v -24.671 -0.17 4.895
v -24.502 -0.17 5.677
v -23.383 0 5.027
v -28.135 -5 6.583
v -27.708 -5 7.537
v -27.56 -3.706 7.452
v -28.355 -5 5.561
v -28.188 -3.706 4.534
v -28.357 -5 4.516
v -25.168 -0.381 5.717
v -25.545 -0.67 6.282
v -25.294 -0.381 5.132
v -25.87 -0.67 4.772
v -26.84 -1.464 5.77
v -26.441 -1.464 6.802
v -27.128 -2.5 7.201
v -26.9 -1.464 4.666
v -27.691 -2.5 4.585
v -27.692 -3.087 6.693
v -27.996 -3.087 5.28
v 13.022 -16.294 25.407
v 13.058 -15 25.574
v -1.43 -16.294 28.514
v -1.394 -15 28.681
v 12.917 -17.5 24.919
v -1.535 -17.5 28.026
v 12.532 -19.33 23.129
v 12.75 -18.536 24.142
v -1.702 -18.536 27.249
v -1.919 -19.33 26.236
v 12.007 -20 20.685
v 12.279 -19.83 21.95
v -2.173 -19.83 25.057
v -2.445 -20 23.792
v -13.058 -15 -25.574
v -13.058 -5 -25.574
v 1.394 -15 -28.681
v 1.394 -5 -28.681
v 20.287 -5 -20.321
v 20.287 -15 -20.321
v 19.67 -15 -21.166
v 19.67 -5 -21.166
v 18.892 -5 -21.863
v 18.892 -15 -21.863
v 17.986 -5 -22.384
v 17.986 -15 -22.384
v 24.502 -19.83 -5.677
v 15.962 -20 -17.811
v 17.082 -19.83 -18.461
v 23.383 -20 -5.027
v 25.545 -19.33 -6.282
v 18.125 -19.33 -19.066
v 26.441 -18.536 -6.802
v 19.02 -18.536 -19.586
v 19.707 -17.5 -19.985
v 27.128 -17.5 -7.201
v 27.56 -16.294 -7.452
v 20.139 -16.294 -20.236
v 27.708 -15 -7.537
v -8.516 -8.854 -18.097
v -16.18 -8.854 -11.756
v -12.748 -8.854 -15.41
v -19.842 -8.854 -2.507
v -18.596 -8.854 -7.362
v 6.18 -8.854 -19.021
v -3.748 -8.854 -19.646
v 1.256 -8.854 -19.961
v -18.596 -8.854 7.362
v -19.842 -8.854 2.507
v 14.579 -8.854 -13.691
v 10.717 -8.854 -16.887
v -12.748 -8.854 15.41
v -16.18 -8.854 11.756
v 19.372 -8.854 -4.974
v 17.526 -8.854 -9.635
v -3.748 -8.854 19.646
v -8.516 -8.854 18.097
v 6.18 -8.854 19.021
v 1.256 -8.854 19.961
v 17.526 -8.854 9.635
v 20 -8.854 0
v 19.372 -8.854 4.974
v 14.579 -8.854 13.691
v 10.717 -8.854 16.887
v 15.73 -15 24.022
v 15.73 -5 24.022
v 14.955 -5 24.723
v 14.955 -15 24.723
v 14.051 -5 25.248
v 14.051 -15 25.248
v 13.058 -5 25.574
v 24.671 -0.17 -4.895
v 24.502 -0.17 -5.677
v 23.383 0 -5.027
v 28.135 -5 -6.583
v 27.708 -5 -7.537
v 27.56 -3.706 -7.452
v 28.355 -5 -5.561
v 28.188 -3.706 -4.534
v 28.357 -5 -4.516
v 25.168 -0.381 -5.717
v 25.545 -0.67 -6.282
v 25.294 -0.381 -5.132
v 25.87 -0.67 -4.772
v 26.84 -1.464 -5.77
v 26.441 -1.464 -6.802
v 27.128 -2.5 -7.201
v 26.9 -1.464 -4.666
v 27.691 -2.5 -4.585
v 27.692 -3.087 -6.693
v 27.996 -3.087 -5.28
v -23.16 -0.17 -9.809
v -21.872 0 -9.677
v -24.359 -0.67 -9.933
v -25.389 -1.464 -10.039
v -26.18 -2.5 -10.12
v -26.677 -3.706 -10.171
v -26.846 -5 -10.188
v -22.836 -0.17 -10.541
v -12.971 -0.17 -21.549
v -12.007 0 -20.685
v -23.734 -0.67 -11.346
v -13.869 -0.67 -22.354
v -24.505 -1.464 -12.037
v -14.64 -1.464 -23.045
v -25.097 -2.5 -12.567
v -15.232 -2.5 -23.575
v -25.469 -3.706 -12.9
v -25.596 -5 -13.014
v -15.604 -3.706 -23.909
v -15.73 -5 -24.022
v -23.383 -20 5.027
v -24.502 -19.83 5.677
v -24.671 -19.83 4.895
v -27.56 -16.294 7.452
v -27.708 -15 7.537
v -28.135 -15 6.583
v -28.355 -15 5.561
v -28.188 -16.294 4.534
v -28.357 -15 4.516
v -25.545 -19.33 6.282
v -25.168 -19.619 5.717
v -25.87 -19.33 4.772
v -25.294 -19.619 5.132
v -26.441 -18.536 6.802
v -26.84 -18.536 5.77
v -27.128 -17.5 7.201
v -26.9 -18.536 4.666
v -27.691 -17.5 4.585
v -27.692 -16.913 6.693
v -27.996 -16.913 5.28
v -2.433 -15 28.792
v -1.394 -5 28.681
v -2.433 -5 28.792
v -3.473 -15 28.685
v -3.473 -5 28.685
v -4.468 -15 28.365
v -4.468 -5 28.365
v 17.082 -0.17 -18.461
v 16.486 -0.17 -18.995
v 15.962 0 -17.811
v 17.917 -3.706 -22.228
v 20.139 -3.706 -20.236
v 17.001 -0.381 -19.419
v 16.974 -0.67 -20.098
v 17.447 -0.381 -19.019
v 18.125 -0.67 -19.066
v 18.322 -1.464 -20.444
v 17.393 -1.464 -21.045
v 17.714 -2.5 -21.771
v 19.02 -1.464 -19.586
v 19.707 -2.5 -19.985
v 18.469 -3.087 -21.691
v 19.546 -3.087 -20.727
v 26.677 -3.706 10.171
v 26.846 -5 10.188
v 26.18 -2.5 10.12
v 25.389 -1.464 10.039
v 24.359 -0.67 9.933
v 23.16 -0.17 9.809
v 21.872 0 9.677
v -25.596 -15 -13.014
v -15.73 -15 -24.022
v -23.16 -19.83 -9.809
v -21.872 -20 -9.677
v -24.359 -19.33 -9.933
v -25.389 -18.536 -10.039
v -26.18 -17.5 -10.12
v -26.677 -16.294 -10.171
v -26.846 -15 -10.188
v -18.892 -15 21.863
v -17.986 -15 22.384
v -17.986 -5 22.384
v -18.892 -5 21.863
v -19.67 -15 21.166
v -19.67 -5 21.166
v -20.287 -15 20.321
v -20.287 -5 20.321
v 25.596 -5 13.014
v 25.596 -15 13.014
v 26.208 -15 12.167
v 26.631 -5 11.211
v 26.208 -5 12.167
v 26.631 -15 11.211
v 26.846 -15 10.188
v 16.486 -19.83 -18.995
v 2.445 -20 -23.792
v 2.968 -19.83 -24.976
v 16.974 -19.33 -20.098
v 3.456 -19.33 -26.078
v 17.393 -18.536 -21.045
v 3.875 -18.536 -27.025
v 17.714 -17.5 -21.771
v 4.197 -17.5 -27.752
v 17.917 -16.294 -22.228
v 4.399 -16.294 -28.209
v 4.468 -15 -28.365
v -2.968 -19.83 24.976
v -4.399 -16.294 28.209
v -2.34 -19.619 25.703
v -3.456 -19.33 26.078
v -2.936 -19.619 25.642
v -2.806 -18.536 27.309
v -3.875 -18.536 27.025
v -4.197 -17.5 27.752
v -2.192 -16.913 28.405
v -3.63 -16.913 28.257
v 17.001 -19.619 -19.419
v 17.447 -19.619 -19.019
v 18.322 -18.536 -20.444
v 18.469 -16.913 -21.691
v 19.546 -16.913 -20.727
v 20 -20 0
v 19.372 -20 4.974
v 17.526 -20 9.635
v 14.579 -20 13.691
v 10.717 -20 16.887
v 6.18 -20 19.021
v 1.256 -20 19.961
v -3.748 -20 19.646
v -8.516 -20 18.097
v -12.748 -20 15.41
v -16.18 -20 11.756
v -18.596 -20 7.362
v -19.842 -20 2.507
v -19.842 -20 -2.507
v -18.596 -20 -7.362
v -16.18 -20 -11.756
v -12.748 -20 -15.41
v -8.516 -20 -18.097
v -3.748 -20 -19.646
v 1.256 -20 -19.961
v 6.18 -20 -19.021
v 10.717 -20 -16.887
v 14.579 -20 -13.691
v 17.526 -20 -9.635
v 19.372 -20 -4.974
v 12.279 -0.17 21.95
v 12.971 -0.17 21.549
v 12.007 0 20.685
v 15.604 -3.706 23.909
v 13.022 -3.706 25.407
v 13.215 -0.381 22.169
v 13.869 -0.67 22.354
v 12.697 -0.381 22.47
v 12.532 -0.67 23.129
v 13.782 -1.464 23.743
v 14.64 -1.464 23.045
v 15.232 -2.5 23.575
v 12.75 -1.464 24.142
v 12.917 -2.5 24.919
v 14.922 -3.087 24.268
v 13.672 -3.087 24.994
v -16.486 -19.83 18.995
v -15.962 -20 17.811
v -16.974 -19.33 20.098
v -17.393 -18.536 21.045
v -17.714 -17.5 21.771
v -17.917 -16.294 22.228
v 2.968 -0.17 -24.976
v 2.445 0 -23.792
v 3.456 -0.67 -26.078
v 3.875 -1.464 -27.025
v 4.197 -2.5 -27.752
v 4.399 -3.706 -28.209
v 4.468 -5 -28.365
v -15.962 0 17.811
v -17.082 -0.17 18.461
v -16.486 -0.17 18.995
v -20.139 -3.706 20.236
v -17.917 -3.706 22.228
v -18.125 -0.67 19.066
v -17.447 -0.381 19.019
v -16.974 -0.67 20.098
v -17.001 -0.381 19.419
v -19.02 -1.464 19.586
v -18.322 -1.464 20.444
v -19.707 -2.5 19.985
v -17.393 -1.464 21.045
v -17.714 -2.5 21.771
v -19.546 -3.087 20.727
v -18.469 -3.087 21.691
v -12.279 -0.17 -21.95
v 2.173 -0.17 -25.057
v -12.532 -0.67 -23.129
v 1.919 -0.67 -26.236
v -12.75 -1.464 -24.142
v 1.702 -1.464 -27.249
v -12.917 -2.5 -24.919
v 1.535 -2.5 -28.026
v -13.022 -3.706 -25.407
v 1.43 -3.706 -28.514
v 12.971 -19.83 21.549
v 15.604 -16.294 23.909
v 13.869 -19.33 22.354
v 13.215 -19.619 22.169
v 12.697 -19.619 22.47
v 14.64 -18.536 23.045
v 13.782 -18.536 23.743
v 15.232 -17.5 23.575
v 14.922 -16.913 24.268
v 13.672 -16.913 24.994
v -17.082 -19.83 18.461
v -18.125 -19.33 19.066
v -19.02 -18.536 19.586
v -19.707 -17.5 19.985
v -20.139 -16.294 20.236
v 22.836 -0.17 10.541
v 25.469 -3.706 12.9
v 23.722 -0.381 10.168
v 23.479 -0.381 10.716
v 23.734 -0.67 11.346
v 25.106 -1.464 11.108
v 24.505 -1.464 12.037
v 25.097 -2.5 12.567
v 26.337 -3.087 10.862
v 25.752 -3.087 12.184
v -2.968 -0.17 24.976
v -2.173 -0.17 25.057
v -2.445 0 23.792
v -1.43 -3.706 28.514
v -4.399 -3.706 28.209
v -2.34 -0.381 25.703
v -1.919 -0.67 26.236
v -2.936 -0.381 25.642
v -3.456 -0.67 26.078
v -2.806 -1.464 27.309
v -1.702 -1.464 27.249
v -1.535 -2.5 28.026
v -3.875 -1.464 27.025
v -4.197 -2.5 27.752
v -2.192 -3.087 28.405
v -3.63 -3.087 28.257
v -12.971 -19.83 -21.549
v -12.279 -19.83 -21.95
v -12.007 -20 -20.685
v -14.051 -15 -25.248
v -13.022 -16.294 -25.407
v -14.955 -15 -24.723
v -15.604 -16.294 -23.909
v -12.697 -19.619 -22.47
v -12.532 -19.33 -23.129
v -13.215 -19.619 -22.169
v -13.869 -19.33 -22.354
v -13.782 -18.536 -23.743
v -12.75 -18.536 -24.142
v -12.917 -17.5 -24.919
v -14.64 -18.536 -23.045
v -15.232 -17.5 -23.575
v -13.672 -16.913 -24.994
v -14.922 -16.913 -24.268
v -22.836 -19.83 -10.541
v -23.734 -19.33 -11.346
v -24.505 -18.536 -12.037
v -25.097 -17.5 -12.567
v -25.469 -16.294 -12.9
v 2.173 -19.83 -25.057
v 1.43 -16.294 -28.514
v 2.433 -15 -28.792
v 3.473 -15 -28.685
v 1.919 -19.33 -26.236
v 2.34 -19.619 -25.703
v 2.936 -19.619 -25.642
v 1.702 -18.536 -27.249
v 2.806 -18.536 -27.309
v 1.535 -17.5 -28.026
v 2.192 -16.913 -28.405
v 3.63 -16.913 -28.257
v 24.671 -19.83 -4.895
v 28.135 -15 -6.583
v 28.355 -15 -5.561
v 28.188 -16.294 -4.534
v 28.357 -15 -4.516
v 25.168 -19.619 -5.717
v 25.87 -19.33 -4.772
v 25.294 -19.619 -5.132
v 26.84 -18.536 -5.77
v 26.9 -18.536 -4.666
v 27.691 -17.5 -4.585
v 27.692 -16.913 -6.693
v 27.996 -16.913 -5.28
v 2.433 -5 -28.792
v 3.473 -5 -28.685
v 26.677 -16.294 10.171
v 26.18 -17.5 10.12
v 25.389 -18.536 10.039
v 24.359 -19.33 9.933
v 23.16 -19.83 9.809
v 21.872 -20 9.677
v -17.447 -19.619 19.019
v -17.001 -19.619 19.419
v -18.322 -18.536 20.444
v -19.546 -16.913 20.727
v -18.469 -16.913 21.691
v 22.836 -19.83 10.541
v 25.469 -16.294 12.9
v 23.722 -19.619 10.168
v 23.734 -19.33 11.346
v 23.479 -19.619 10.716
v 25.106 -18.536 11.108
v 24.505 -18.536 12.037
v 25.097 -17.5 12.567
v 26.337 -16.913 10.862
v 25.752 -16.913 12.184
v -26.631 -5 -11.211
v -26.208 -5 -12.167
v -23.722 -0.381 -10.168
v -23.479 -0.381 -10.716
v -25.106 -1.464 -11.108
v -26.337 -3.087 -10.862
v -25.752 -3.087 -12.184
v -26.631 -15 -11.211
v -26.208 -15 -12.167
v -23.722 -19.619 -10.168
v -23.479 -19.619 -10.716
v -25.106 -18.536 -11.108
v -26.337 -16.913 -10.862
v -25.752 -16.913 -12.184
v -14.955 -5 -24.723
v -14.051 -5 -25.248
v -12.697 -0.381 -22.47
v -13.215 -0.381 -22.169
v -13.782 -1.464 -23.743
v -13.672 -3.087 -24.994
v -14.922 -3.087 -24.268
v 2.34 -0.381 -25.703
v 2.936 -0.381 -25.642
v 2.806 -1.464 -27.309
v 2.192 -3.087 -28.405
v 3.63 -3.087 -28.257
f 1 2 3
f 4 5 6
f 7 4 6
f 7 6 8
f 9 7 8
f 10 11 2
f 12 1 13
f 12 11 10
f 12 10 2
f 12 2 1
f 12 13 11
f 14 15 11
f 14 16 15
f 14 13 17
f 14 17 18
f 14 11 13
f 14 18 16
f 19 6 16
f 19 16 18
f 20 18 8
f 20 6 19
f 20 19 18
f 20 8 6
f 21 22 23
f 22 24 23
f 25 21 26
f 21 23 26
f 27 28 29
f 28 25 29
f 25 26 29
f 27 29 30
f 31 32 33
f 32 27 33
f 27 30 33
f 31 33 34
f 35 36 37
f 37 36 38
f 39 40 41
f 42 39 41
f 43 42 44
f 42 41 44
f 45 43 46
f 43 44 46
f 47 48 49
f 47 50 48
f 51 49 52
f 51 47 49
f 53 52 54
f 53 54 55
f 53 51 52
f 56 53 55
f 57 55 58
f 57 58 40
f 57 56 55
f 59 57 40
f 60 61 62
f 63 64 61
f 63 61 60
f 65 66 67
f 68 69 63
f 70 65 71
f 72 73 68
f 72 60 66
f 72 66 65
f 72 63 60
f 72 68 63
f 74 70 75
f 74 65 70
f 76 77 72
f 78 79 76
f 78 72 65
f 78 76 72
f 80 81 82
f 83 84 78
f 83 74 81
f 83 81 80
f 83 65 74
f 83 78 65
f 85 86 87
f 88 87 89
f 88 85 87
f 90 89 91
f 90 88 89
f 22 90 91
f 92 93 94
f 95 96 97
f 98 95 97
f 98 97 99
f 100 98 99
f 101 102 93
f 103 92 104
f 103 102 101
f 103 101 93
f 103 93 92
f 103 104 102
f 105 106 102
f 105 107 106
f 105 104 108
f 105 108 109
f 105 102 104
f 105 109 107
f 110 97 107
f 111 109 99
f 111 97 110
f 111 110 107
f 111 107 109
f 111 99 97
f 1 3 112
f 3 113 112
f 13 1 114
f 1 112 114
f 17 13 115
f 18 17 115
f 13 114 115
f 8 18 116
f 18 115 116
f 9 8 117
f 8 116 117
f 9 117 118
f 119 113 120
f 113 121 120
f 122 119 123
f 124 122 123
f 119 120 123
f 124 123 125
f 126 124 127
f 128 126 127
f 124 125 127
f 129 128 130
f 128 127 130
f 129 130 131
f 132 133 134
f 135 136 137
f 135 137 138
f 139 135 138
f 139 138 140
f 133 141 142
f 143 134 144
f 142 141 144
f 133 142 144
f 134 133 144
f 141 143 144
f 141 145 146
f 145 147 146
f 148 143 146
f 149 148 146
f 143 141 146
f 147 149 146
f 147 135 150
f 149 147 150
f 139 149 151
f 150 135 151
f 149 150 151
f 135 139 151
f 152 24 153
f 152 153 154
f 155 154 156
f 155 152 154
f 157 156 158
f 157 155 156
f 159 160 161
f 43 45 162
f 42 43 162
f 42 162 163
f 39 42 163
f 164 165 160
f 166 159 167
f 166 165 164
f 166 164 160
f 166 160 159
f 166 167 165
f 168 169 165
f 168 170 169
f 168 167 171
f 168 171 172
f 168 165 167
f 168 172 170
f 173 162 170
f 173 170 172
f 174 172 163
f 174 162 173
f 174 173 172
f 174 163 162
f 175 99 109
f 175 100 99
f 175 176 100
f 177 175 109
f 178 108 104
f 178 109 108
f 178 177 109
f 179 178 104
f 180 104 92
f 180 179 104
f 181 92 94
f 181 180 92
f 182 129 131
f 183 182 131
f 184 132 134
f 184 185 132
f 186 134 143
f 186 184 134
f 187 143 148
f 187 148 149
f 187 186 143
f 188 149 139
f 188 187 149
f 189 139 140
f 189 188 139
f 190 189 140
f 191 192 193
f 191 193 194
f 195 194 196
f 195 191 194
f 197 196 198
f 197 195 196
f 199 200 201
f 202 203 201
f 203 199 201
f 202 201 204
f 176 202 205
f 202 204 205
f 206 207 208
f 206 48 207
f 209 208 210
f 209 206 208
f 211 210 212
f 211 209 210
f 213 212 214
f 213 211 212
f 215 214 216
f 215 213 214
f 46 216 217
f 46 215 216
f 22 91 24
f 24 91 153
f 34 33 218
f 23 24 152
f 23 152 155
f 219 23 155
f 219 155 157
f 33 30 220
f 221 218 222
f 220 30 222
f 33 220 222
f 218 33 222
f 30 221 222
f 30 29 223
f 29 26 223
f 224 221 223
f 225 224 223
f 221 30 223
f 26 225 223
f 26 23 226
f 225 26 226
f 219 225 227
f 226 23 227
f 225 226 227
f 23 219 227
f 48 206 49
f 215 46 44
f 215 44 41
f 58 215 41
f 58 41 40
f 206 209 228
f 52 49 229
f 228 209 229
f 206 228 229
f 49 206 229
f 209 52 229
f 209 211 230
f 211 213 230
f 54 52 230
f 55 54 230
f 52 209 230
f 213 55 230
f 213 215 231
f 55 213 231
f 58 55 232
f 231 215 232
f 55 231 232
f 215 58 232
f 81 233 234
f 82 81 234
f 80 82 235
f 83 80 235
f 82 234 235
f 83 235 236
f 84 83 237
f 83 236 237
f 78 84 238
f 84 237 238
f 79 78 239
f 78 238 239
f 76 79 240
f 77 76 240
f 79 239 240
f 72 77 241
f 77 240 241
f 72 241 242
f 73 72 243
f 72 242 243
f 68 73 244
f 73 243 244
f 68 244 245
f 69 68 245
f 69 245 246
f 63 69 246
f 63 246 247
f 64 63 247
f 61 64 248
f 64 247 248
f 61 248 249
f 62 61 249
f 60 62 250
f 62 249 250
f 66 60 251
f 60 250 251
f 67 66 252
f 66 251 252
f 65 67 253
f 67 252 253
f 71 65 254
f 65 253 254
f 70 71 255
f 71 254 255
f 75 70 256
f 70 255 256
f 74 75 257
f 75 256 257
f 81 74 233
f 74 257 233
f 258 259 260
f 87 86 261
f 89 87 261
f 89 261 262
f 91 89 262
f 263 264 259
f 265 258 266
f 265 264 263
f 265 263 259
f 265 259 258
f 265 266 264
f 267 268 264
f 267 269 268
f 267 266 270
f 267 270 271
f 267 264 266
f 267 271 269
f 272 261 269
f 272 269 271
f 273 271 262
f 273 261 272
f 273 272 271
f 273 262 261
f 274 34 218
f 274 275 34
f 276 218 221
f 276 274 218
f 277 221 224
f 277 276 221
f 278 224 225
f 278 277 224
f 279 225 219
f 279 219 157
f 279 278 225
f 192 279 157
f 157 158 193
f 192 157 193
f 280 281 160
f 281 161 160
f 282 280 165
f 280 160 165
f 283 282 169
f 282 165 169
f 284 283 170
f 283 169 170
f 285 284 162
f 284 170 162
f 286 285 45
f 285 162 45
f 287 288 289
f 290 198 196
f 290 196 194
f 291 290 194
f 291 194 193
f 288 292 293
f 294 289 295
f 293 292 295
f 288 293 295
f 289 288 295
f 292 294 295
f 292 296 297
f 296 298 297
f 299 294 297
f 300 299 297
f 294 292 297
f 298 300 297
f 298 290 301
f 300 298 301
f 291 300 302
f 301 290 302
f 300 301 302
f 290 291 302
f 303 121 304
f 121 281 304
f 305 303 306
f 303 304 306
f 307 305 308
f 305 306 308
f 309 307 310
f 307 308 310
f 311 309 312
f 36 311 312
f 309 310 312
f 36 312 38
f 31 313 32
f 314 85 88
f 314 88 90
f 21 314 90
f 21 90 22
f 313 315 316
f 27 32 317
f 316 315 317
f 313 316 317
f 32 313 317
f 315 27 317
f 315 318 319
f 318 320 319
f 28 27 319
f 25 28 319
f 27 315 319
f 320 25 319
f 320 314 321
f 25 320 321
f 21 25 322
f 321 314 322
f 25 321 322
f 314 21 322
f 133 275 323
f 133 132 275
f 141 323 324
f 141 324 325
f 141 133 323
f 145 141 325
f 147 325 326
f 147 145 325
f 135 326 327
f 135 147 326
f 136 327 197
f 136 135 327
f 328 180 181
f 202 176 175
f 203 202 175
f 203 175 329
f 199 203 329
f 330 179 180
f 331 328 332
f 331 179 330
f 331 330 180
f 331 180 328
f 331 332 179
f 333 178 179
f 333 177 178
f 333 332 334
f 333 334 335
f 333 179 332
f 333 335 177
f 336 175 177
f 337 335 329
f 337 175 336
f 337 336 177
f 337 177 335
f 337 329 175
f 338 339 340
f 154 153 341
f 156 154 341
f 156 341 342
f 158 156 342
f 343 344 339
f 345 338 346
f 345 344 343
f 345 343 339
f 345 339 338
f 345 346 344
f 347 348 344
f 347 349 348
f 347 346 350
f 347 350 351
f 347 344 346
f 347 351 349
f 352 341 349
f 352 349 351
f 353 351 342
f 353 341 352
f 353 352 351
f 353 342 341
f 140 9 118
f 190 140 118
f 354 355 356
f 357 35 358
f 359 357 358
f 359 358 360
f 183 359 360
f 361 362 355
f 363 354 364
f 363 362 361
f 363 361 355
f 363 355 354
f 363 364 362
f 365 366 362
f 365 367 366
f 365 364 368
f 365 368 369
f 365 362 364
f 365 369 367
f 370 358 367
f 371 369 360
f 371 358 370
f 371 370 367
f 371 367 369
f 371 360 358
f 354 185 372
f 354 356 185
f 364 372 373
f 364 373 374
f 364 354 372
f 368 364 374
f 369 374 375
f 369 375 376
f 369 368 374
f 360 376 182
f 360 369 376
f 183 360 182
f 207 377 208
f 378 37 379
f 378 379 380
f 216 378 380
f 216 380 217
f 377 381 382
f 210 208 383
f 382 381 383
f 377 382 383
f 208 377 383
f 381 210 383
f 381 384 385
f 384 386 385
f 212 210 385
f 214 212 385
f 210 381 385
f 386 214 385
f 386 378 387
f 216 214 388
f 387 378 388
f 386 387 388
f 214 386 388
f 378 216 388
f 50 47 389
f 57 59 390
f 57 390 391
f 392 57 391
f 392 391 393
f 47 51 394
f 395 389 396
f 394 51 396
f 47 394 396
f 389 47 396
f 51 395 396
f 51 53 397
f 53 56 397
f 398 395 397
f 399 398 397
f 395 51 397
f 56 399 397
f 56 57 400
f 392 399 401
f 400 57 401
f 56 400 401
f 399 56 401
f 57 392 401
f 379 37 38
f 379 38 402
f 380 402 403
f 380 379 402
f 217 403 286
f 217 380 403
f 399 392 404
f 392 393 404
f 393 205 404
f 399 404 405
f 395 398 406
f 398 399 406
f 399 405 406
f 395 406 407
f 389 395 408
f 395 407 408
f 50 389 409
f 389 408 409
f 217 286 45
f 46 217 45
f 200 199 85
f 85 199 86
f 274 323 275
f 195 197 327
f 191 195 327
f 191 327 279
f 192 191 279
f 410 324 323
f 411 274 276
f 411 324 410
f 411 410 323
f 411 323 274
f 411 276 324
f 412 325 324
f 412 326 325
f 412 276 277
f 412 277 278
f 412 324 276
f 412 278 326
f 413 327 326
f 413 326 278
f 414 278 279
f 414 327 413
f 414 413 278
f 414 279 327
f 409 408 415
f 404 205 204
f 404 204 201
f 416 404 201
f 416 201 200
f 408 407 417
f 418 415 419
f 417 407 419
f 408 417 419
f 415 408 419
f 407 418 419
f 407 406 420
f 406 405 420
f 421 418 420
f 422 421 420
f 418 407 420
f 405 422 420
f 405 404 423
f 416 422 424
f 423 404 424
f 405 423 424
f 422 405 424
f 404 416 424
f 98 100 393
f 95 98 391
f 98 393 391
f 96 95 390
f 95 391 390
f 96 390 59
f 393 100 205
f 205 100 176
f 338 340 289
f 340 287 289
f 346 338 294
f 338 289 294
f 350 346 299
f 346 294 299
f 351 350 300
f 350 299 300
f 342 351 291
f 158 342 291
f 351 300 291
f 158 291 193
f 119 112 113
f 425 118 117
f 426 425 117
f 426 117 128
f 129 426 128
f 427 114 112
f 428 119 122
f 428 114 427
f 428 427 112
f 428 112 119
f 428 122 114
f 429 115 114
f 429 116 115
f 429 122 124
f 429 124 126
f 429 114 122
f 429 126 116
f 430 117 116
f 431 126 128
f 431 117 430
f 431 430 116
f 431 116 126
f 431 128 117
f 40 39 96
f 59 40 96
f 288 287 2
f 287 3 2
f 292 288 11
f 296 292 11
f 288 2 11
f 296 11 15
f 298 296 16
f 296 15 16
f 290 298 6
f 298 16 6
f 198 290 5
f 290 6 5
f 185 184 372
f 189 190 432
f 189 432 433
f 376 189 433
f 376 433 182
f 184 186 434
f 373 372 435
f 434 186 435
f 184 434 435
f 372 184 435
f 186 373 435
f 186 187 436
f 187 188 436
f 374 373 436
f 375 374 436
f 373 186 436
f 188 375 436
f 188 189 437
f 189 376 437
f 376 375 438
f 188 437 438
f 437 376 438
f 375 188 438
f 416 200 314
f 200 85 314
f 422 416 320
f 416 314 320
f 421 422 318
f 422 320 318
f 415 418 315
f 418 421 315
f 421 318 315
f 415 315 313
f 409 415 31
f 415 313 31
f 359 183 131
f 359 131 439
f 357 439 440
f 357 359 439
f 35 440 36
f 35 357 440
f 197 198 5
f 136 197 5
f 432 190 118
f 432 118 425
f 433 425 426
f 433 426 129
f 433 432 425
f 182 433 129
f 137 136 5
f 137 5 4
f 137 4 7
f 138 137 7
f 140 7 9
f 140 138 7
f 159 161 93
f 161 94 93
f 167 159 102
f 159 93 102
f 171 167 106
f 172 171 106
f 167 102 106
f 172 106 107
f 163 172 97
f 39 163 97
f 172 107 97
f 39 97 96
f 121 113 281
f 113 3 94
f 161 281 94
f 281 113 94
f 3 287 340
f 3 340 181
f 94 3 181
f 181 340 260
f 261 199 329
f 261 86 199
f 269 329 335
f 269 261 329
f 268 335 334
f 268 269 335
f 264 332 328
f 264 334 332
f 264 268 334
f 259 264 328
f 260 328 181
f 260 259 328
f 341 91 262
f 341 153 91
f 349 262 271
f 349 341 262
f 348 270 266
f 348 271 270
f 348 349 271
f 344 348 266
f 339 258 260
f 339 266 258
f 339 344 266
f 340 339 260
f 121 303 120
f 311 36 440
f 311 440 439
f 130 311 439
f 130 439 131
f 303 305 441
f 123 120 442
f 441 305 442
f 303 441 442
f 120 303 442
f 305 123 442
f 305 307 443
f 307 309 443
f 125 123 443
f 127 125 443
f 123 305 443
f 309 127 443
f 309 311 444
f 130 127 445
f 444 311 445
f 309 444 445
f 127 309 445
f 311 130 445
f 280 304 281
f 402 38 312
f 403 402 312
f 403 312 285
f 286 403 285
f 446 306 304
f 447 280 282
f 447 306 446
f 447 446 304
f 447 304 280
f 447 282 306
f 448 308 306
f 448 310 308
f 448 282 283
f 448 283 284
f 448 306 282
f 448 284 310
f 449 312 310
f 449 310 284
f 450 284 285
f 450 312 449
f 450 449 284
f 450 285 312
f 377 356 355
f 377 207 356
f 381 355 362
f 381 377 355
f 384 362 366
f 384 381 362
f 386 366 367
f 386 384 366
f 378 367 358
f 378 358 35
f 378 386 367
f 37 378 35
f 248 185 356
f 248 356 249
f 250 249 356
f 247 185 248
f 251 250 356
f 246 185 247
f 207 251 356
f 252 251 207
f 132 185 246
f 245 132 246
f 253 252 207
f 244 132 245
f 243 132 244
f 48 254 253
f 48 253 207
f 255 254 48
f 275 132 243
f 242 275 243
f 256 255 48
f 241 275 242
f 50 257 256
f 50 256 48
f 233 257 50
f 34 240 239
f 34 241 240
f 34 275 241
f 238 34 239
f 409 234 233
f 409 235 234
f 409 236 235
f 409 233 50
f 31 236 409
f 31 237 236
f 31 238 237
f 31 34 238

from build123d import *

# Parameters (mm, degrees)
F1_DEPTH = 20
F2_R     = 20
F3_DEPTH = 11.146497
F4_R     = 5


with BuildPart() as f1:
    # F0 (on Front) → F1 (new body)
    with BuildSketch(Plane.XZ):
        Polygon((26.680096, 11.804356), (14.646225, 25.232092), (-2.982007, 29.022026), (-19.471213, 21.726533), (-28.523077, 6.132242), (-26.680096, -11.804356), (-14.646225, -25.232092), (2.982007, -29.022026), (19.471213, -21.726533), (28.523077, -6.132242), align=None)
    extrude(amount=F1_DEPTH)

    # F2 (on face) → F3 (cut)
    with BuildSketch(Plane.XZ.offset(20)):
        Circle(F2_R)
    extrude(amount=-F3_DEPTH, mode=Mode.SUBTRACT)

    # F4
    f4_edges = [f1.edges().sort_by_distance(p)[0] for p in [
        (-11.22661, 0, 25.374279),
        (-19.471213, -10, 21.726533),
        (-28.523077, -10, 6.132242),
        (-23.997145, 0, 13.929387),
        (-23.997145, -20, 13.929387),
        (-26.680096, -10, -11.804356),
        (-27.601587, 0, -2.836057),
        (-27.601587, -20, -2.836057),
        (-20.66316, 0, -18.518224),
        (-14.646225, -10, -25.232092),
        (2.982007, -10, -29.022026),
        (-5.832109, 0, -27.127059),
        (-5.832109, -20, -27.127059),
        (19.471213, -10, -21.726533),
        (11.22661, 0, -25.374279),
        (11.22661, -20, -25.374279),
        (28.523077, -10, -6.132242),
        (23.997145, 0, -13.929387),
        (23.997145, -20, -13.929387),
        (26.680096, -10, 11.804356),
        (27.601587, 0, 2.836057),
        (27.601587, -20, 2.836057),
        (14.646225, -10, 25.232092),
        (20.66316, 0, 18.518224),
        (20.66316, -20, 18.518224),
        (-2.982007, -10, 29.022026),
        (5.832109, 0, 27.127059),
        (5.832109, -20, 27.127059),
        (-11.22661, -20, 25.374279),
        (-20.66316, -20, -18.518224),
    ]]
    fillet(f4_edges, radius=F4_R)


solid = f1.part
